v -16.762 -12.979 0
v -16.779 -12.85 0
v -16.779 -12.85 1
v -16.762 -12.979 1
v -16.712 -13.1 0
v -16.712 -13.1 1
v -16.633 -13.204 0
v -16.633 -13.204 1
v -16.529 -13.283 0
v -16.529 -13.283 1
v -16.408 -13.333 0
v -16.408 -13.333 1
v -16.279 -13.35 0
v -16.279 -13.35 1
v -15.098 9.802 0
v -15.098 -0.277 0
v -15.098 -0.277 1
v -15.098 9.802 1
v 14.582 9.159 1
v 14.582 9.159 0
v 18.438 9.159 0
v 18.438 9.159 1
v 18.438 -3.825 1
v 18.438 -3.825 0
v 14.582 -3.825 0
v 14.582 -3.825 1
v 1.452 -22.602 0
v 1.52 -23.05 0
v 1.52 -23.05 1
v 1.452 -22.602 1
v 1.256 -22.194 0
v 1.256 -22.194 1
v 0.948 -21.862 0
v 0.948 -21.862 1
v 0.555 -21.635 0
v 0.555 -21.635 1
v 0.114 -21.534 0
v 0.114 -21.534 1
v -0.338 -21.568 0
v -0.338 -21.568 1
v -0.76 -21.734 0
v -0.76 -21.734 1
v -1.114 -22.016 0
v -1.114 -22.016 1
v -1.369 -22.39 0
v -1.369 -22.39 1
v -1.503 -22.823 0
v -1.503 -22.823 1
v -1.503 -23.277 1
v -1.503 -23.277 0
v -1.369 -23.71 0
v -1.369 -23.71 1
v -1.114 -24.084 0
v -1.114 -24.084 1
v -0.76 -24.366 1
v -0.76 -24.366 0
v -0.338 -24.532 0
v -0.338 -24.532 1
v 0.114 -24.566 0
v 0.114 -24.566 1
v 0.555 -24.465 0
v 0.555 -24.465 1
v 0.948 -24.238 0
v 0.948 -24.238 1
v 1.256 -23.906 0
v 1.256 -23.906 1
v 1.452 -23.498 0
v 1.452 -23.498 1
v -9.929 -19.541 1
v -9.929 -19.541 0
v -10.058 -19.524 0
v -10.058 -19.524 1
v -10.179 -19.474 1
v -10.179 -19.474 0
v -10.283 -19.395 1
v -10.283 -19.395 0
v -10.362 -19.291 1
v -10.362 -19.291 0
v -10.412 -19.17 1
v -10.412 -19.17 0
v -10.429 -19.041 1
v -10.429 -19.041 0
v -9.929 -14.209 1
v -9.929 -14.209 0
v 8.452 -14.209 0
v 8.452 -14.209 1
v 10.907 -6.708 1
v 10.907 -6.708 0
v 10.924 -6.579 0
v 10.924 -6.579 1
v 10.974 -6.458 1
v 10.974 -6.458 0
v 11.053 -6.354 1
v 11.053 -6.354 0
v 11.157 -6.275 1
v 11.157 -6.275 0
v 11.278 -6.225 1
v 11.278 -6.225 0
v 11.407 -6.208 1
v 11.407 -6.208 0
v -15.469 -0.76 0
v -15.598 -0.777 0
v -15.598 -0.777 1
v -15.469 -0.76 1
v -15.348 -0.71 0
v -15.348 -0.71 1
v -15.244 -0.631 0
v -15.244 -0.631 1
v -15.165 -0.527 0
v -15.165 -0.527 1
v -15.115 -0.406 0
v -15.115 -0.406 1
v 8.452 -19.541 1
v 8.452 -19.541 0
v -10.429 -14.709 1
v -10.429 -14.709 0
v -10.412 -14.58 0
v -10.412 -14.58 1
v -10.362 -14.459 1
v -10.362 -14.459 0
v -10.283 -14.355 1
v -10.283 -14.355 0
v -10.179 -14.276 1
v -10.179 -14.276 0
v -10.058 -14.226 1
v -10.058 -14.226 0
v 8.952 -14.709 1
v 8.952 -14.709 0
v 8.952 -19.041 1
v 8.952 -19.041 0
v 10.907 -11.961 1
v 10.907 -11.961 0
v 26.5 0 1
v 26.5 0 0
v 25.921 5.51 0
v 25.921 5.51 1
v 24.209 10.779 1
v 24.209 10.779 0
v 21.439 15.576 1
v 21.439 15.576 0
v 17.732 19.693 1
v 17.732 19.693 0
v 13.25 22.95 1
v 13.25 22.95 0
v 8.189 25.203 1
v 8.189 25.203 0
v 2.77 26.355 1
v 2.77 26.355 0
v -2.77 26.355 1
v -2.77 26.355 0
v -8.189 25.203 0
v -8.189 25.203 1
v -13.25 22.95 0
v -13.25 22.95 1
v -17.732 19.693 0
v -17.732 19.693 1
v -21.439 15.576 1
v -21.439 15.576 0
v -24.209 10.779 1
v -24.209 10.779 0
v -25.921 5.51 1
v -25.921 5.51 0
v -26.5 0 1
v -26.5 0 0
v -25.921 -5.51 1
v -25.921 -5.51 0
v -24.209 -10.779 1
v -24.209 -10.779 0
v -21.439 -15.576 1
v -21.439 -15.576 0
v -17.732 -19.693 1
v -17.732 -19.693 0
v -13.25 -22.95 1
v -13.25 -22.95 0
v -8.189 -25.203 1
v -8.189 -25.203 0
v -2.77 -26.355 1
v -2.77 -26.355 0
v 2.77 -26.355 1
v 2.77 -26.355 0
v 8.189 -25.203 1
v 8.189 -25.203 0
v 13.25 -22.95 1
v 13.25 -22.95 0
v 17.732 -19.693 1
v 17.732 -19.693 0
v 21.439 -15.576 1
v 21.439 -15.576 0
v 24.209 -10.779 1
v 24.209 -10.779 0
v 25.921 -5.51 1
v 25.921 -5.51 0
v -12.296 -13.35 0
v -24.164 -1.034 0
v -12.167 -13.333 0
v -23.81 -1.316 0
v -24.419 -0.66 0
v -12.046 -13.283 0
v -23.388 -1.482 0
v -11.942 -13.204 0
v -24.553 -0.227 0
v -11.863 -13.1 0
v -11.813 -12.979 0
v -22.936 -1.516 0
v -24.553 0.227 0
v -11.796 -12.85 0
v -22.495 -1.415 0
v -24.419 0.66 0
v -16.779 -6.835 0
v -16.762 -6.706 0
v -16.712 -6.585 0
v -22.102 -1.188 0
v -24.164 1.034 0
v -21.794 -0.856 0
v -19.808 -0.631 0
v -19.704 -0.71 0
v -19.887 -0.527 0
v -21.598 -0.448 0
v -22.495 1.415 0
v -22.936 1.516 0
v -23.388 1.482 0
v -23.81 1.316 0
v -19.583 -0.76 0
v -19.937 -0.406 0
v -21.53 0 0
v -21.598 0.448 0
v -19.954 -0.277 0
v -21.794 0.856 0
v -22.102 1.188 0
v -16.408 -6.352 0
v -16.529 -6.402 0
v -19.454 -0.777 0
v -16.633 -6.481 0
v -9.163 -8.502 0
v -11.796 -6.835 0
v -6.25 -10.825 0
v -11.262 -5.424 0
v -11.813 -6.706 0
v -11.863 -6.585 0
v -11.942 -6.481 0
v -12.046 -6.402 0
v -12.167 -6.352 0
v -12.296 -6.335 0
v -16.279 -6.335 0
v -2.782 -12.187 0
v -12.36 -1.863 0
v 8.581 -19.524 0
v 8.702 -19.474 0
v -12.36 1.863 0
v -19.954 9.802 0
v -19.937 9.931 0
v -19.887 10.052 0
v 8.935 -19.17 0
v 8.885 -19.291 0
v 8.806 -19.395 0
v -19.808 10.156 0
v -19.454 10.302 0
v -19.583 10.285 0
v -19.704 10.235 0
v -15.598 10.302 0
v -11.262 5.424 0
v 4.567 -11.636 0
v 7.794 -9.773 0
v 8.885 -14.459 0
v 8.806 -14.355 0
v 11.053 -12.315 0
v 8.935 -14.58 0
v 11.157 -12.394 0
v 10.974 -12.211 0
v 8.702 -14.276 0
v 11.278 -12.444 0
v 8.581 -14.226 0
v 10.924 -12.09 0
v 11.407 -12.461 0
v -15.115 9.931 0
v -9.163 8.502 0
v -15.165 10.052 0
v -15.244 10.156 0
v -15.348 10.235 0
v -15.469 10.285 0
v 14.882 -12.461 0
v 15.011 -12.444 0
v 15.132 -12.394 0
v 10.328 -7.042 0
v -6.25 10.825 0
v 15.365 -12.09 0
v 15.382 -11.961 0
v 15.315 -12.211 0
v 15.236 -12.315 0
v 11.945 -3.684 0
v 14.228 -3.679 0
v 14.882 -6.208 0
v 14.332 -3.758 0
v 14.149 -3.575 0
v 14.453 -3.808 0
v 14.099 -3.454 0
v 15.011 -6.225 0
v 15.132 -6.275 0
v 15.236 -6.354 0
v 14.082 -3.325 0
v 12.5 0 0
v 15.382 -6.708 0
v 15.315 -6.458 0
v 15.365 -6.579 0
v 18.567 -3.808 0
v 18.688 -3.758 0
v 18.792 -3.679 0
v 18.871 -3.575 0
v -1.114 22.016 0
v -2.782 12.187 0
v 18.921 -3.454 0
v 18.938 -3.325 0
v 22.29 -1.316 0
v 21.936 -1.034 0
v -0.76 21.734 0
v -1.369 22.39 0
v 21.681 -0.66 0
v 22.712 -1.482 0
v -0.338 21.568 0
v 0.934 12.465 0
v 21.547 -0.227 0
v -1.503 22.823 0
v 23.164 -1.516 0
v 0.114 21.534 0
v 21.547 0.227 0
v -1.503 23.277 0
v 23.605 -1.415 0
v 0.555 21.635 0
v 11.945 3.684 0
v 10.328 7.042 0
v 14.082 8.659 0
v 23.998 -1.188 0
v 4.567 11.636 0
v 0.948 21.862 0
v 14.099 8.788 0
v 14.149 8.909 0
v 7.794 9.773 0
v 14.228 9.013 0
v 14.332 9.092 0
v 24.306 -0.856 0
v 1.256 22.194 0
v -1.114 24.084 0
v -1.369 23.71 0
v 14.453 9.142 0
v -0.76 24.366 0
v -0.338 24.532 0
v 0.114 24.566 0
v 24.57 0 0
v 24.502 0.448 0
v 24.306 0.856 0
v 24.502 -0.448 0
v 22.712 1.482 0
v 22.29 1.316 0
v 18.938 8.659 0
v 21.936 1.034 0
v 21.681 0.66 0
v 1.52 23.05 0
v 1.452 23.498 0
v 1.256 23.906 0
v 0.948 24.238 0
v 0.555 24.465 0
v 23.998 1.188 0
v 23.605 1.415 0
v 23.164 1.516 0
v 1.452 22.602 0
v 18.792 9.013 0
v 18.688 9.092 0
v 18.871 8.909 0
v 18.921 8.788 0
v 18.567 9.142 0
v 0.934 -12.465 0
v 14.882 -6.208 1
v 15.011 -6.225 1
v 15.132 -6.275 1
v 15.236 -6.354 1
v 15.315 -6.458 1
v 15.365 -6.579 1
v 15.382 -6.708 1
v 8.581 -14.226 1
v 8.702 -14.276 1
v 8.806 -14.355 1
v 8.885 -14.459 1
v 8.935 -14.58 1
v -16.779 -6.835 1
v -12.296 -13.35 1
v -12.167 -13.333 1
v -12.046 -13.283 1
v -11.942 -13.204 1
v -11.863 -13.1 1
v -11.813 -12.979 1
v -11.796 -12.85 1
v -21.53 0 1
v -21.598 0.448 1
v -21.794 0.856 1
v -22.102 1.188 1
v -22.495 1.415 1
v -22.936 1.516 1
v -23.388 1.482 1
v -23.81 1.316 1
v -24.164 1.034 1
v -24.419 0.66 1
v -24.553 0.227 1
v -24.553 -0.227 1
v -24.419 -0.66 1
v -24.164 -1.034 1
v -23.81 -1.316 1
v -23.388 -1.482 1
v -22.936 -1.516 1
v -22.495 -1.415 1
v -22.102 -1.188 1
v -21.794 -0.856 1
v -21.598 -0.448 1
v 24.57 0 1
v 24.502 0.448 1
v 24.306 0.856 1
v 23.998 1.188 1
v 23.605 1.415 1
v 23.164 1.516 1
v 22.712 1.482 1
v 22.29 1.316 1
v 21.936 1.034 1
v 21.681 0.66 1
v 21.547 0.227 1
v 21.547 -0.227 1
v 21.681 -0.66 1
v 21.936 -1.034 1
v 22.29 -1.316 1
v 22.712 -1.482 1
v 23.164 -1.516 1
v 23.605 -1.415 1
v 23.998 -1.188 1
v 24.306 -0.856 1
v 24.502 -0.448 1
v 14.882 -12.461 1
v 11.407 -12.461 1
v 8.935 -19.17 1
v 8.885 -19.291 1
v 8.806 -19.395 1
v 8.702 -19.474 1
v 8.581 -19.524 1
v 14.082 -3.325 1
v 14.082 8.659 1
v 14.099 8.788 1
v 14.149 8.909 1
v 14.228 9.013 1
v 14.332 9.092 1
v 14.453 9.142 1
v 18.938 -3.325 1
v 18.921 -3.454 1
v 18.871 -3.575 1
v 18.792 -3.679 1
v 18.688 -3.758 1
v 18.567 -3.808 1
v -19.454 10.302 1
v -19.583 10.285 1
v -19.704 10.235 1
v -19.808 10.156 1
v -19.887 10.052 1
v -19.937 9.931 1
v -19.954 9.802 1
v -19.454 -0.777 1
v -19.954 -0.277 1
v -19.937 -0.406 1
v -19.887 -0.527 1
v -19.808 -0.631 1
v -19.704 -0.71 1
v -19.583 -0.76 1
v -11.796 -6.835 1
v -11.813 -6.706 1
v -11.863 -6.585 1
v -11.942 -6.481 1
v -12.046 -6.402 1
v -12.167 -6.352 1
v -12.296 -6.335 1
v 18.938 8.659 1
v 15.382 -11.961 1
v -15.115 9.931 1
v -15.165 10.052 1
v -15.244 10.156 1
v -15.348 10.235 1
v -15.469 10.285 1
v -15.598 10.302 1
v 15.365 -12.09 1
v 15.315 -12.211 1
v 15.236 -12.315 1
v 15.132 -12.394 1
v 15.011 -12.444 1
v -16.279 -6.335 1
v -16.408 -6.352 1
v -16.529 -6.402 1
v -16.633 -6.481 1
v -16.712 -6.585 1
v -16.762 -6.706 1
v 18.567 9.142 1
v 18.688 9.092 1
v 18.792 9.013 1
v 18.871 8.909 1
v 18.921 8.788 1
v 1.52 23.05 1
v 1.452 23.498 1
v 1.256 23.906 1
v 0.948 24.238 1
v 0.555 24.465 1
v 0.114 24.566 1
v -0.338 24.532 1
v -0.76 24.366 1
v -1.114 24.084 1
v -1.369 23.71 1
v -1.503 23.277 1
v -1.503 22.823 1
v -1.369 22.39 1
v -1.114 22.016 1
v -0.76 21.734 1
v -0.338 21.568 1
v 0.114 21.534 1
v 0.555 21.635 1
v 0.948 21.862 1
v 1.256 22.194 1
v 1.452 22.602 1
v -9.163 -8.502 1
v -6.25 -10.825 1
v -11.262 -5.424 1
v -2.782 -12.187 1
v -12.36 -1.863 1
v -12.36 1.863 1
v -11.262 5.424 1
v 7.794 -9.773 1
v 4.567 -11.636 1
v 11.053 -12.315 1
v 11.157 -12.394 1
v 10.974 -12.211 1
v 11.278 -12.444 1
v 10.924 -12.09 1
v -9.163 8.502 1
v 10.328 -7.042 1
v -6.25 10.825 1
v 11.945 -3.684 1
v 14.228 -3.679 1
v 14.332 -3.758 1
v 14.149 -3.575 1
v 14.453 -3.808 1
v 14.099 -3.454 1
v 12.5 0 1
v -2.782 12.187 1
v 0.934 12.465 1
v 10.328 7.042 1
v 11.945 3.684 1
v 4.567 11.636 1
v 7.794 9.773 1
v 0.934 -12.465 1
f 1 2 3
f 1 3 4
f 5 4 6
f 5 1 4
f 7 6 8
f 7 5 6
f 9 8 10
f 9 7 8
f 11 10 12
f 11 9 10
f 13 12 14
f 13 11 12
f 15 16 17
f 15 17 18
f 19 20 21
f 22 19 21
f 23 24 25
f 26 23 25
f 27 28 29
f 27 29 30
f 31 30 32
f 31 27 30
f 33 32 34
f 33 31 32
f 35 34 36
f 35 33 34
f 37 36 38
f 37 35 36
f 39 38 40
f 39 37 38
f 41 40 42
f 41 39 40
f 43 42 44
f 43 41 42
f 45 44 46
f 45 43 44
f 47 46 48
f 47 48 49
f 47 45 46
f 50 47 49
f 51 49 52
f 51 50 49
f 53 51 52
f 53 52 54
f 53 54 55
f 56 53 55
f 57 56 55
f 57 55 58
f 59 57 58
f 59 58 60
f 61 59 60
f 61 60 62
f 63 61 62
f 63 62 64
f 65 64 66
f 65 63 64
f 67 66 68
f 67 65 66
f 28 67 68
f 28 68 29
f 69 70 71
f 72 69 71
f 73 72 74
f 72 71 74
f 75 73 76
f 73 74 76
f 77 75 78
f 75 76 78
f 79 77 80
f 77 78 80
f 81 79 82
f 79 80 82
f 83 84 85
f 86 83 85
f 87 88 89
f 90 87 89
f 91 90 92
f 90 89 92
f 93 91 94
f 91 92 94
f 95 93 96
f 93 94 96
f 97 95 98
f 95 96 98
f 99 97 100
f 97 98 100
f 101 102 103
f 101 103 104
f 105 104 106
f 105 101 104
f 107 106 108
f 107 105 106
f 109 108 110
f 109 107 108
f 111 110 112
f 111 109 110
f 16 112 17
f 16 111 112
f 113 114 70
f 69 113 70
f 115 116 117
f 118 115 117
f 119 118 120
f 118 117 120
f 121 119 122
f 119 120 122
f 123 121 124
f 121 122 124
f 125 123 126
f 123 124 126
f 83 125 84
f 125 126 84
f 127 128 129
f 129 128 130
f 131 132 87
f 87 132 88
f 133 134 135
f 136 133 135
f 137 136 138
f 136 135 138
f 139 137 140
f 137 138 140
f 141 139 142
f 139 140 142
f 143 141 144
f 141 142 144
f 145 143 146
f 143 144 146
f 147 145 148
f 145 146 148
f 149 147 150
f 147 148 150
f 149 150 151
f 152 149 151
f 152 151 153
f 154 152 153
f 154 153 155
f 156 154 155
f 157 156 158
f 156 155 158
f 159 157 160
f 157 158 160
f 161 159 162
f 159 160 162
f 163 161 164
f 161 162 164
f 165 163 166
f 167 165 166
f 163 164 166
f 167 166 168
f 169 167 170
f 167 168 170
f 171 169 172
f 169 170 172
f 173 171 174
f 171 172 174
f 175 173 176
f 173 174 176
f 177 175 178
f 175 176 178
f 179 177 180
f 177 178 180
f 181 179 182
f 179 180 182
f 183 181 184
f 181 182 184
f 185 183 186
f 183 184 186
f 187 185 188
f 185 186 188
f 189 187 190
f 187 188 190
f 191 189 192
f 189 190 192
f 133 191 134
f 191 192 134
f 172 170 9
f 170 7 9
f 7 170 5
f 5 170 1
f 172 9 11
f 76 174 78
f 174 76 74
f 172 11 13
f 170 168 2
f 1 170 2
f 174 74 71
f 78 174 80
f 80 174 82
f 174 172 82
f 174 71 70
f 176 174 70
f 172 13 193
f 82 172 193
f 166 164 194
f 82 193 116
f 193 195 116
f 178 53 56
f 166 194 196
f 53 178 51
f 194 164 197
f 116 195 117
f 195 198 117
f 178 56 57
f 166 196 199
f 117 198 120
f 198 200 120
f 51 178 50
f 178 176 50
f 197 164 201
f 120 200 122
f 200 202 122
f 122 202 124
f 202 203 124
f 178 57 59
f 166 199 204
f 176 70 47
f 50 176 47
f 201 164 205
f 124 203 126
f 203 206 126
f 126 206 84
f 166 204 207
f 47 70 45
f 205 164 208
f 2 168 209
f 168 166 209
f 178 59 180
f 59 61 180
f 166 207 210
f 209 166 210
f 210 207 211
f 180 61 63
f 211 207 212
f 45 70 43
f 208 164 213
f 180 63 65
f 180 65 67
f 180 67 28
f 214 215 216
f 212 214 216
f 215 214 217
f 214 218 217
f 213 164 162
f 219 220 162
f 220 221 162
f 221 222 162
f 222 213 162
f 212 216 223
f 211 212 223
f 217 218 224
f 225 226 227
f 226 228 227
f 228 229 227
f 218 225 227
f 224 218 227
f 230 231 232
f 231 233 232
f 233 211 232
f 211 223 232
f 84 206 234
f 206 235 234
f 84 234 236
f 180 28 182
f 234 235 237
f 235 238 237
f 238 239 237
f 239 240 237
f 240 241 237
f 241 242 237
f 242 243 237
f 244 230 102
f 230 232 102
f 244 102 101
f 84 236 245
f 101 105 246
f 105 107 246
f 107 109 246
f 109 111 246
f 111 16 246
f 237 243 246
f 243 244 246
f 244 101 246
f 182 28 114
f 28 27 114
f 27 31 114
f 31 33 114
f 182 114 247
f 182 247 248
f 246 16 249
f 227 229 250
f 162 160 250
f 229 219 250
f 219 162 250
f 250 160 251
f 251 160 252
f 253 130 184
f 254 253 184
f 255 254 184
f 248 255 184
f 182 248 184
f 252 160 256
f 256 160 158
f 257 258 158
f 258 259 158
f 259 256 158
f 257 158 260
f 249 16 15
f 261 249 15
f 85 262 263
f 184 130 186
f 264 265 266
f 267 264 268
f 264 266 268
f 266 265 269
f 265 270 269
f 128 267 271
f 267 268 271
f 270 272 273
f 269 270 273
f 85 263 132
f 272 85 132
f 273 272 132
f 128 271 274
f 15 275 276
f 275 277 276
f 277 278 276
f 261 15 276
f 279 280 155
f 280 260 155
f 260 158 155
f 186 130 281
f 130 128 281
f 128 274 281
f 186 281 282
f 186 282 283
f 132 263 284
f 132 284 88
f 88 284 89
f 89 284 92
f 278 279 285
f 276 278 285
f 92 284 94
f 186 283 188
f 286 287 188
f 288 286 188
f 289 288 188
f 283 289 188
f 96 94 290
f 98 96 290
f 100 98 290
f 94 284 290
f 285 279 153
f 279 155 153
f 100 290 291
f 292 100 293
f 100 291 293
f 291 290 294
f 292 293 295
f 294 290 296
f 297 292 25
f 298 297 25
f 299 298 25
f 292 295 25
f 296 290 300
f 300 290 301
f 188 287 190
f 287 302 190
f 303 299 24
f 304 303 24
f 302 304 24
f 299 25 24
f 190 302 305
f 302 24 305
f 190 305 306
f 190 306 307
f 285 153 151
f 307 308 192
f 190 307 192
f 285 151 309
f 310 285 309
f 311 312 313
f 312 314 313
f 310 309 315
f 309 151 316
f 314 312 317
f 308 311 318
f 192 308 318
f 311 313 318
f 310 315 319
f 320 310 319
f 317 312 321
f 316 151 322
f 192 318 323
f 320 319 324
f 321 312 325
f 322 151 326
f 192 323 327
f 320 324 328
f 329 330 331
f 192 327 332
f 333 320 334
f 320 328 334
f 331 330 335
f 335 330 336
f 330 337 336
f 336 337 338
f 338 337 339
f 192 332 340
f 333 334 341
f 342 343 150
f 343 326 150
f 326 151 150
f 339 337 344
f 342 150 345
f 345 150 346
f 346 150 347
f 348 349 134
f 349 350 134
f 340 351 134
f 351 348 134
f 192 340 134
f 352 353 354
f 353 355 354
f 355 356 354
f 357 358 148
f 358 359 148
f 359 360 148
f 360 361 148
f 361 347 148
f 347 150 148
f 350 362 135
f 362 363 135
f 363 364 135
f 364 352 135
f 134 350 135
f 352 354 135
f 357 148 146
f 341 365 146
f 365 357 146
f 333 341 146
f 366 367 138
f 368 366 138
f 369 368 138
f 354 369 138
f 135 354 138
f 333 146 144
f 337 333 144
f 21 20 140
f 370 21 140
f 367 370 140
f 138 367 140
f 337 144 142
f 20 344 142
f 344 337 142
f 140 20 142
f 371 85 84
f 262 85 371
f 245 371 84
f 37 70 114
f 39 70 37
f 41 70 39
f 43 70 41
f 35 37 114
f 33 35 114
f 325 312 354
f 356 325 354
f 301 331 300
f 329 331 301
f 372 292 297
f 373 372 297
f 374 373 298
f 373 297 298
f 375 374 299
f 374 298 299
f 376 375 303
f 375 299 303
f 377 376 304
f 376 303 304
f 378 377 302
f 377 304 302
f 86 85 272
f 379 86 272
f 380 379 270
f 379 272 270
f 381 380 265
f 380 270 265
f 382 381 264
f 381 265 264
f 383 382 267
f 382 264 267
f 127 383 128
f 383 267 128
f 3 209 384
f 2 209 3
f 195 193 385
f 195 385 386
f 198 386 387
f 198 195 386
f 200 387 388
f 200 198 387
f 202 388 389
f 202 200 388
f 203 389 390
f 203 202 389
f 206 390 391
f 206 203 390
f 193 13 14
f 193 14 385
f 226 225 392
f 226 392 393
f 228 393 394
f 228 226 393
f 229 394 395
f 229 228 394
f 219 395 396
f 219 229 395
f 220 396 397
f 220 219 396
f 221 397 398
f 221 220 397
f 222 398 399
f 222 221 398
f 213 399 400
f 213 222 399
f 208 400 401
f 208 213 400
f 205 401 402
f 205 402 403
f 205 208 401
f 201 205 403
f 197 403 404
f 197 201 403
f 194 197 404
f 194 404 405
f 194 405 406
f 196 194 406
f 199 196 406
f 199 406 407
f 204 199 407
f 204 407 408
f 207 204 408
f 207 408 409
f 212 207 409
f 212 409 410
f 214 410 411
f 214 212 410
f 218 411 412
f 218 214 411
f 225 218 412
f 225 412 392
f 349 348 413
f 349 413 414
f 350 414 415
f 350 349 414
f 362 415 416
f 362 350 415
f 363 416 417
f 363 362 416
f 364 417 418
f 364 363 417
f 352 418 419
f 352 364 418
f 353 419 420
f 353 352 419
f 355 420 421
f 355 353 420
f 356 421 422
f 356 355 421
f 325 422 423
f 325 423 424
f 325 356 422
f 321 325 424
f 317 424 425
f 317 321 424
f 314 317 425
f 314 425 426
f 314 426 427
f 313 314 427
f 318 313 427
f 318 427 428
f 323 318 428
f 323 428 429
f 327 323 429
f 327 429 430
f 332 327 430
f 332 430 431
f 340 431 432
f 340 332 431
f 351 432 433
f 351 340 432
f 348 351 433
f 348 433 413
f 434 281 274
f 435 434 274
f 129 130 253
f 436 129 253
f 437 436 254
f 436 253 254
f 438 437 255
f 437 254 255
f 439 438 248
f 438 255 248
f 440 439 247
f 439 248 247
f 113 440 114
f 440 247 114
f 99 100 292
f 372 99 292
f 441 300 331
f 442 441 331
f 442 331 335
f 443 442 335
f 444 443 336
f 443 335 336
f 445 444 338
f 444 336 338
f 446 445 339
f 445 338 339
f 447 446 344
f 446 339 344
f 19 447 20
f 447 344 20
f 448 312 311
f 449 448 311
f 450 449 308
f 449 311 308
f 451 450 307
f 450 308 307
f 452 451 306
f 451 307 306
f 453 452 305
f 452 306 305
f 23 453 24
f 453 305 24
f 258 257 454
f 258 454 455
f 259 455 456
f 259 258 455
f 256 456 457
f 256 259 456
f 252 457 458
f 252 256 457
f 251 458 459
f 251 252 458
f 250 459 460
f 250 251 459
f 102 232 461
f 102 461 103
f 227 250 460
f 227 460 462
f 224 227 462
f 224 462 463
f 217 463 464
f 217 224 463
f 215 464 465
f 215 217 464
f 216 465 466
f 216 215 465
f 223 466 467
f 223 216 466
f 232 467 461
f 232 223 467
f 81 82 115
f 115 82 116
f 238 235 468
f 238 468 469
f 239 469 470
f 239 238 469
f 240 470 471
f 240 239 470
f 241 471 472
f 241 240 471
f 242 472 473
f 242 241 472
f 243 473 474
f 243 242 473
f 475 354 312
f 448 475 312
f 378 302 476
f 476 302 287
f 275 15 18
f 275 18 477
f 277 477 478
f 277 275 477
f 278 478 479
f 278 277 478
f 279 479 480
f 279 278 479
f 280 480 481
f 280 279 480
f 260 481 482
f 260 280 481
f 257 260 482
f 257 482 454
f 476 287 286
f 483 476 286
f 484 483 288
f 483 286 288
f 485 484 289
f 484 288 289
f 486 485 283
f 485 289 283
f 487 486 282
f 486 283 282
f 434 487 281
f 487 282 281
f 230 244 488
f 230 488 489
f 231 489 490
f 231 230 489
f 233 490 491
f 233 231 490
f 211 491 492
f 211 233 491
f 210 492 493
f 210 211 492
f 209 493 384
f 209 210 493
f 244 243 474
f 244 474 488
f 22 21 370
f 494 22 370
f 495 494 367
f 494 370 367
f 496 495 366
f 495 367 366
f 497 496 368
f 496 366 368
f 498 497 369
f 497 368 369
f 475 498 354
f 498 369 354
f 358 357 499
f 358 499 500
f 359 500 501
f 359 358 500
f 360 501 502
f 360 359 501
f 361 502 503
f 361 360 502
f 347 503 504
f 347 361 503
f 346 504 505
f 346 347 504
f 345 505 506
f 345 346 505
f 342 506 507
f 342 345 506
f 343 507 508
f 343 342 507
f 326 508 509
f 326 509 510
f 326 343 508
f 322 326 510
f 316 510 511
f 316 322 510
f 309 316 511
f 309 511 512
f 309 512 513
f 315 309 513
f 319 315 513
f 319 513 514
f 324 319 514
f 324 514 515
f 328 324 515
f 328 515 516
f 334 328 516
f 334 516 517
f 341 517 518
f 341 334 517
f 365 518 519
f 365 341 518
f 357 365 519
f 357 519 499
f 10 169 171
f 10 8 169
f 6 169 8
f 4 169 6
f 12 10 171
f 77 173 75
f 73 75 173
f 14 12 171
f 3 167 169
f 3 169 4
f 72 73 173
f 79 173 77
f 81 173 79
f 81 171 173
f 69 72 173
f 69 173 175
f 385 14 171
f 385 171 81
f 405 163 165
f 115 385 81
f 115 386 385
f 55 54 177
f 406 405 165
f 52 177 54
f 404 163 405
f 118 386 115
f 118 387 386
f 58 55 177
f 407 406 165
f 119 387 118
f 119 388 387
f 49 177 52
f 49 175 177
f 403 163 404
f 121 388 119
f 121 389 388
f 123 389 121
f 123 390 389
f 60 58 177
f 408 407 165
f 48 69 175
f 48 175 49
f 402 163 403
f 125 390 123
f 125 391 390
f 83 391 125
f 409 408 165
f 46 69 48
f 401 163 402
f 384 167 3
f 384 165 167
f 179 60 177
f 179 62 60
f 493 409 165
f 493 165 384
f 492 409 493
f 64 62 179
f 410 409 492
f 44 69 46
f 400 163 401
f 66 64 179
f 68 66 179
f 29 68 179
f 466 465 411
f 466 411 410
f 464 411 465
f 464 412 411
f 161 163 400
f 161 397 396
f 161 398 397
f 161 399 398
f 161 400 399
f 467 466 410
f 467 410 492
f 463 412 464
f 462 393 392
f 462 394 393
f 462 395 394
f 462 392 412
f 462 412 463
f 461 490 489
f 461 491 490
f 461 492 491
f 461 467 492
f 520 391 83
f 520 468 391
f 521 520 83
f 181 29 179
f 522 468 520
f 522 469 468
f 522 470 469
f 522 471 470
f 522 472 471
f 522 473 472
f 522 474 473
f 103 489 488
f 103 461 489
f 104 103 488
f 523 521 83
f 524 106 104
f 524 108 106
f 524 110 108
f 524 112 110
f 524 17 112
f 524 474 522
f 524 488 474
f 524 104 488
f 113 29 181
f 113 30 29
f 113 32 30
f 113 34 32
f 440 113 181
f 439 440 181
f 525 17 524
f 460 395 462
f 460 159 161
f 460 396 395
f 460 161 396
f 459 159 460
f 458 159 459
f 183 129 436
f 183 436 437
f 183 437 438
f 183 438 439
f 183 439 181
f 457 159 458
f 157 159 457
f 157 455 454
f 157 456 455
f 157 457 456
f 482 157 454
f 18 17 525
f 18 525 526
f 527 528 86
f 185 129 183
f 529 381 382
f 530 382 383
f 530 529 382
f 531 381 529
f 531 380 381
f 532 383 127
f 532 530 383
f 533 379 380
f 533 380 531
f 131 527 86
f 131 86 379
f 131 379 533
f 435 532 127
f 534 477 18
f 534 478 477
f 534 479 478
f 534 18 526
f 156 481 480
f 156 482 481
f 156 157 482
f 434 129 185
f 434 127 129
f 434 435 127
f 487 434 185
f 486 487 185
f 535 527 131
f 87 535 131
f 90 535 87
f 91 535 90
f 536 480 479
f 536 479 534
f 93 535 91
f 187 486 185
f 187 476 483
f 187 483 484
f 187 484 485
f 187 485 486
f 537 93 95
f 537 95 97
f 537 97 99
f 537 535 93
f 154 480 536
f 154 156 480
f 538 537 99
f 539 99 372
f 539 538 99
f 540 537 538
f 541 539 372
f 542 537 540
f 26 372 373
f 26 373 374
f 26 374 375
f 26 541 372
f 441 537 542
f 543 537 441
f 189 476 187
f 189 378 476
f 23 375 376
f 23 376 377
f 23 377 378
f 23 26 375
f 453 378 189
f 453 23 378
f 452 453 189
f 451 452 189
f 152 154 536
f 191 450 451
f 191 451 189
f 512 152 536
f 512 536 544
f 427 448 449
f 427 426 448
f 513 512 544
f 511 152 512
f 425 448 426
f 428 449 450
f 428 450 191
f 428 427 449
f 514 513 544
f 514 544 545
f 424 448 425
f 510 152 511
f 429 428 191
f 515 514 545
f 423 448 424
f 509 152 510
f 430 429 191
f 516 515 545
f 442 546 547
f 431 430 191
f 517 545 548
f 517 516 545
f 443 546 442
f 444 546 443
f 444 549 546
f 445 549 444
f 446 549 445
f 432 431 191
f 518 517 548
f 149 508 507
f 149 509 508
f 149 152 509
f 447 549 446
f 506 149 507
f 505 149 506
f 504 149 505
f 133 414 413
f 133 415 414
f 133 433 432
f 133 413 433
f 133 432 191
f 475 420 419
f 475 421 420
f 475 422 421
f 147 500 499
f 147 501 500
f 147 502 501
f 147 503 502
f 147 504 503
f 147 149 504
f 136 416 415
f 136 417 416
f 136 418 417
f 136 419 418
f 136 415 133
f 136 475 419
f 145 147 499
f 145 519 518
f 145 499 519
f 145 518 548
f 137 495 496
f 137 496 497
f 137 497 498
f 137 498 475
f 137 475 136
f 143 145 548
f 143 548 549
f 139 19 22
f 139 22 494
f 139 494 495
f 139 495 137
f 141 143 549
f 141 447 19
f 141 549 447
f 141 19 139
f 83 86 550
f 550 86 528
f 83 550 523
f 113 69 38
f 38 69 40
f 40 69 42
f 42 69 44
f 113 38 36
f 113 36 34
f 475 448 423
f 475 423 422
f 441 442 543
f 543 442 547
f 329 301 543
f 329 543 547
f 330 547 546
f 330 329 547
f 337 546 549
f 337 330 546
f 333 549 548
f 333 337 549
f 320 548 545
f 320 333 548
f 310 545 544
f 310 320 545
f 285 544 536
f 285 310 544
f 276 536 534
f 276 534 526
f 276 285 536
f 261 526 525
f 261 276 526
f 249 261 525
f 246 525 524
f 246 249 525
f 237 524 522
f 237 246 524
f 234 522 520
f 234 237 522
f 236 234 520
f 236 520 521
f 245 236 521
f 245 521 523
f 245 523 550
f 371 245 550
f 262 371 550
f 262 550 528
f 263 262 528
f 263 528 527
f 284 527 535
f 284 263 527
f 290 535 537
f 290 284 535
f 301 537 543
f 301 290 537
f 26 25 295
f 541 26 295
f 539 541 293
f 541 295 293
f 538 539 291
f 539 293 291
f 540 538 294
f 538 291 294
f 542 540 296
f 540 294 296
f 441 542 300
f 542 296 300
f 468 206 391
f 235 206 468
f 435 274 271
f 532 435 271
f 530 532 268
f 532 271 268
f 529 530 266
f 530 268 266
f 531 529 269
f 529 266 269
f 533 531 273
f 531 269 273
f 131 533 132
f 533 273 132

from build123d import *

# Parameters (mm, degrees)
SKETCH_1_R          = 26.5
SKETCH_1_R_2        = 12.5
EXTRUDE_1_DEPTH     = 1
CUT_EXTRUDE_START   = 2.5
CUT_EXTRUDE_1_DEPTH = 1
SKETCH_3_R          = 1.52
CUT_EXTRUDE_2_DEPTH = 1


with BuildPart() as part:
    # 草图1 → 凸台-拉伸1 (new body)
    with BuildSketch(Plane.XY):
        Circle(SKETCH_1_R)
        Circle(SKETCH_1_R_2, mode=Mode.SUBTRACT)
    extrude(amount=EXTRUDE_1_DEPTH)

    # 草图2 → 切除-拉伸1 (cut)
    with BuildSketch(Plane(origin=(22.803986485, -9.350307143, -2.5), x_dir=(1, 0, 0), z_dir=(0, 0, 1)).offset(CUT_EXTRUDE_START)):
        with BuildLine():
            Line((-38.401990025, 19.652309401), (-42.257990025, 19.652309401))
            ThreePointArc((-42.257990025, 19.652309401), (-42.611543416, 19.505862792), (-42.757990025, 19.152309401))
            Line((-42.757990025, 19.152309401), (-42.757990025, 9.073309401))
            ThreePointArc((-42.757990025, 9.073309401), (-42.611543416, 8.719756011), (-42.257990025, 8.573309401))
            Line((-42.257990025, 8.573309401), (-38.401990025, 8.573309401))
            ThreePointArc((-38.401990025, 8.573309401), (-38.048436635, 8.719756011), (-37.901990025, 9.073309401))
            Line((-37.901990025, 9.073309401), (-37.901990025, 19.152309401))
            ThreePointArc((-37.901990025, 19.152309401), (-38.048436635, 19.505862792), (-38.401990025, 19.652309401))
        make_face()
        with BuildLine():
            Line((-8.221986913, 18.50930464), (-4.365986913, 18.50930464))
            ThreePointArc((-4.365986913, 18.50930464), (-4.012433522, 18.362858031), (-3.865986913, 18.00930464))
            Line((-3.865986913, 18.00930464), (-3.865986913, 6.02530464))
            ThreePointArc((-3.865986913, 6.02530464), (-4.012433522, 5.67175125), (-4.365986913, 5.52530464))
            Line((-4.365986913, 5.52530464), (-8.221986913, 5.52530464))
            ThreePointArc((-8.221986913, 5.52530464), (-8.575540303, 5.67175125), (-8.721986913, 6.02530464))
            Line((-8.721986913, 6.02530464), (-8.721986913, 18.00930464))
            ThreePointArc((-8.721986913, 18.00930464), (-8.575540303, 18.362858031), (-8.221986913, 18.50930464))
        make_face()
        with BuildLine():
            Line((-32.732983006, -4.858695665), (-14.351988011, -4.858695665))
            ThreePointArc((-14.351988011, -4.858695665), (-13.998434621, -5.005142274), (-13.851988011, -5.358695665))
            Line((-13.851988011, -5.358695665), (-13.851988011, -9.690695176))
            ThreePointArc((-13.851988011, -9.690695176), (-13.998434621, -10.044248567), (-14.351988011, -10.190695176))
            Line((-14.351988011, -10.190695176), (-32.732983006, -10.190695176))
            ThreePointArc((-32.732983006, -10.190695176), (-33.086536397, -10.044248567), (-33.232983006, -9.690695176))
            Line((-33.232983006, -9.690695176), (-33.232983006, -5.358695665))
            ThreePointArc((-33.232983006, -5.358695665), (-33.086536397, -5.005142274), (-32.732983006, -4.858695665))
        make_face()
        with BuildLine():
            Line((-35.099987523, 3.015306044), (-39.082987523, 3.015306044))
            ThreePointArc((-39.082987523, 3.015306044), (-39.436540913, 2.868859435), (-39.582987523, 2.515306044))
            Line((-39.582987523, 2.515306044), (-39.582987523, -3.499693956))
            ThreePointArc((-39.582987523, -3.499693956), (-39.436540913, -3.853247346), (-39.082987523, -3.999693956))
            Line((-39.082987523, -3.999693956), (-35.099987523, -3.999693956))
            ThreePointArc((-35.099987523, -3.999693956), (-34.746434132, -3.853247346), (-34.599987523, -3.499693956))
            Line((-34.599987523, -3.499693956), (-34.599987523, 2.515306044))
            ThreePointArc((-34.599987523, 2.515306044), (-34.746434132, 2.868859435), (-35.099987523, 3.015306044))
        make_face()
        with BuildLine():
            Line((-11.396988316, 3.142309279), (-7.921988316, 3.142309279))
            ThreePointArc((-7.921988316, 3.142309279), (-7.568434926, 2.99586267), (-7.421988316, 2.642309279))
            Line((-7.421988316, 2.642309279), (-7.421988316, -2.610690721))
            ThreePointArc((-7.421988316, -2.610690721), (-7.568434926, -2.964244111), (-7.921988316, -3.110690721))
            Line((-7.921988316, -3.110690721), (-11.396988316, -3.110690721))
            ThreePointArc((-11.396988316, -3.110690721), (-11.750541707, -2.964244111), (-11.896988316, -2.610690721))
            Line((-11.896988316, -2.610690721), (-11.896988316, 2.642309279))
            ThreePointArc((-11.896988316, 2.642309279), (-11.750541707, 2.99586267), (-11.396988316, 3.142309279))
        make_face()
    extrude(amount=CUT_EXTRUDE_1_DEPTH, mode=Mode.SUBTRACT)

    # 草图3 → 切除-拉伸2 (cut)
    with BuildSketch(Plane(origin=(22.803986485, -9.350307143, -2.5), x_dir=(1, 0, 0), z_dir=(0, 0, 1)).offset(CUT_EXTRUDE_START)):
        with Locations((-22.803986485, 32.400306763)):
            Circle(SKETCH_3_R)
        with Locations((-45.853986105, 9.350307143)):
            Circle(SKETCH_3_R)
        with Locations((-22.803986485, -13.699692477)):
            Circle(SKETCH_3_R)
        with Locations((0.246013135, 9.350307143)):
            Circle(SKETCH_3_R)
    extrude(amount=CUT_EXTRUDE_2_DEPTH, mode=Mode.SUBTRACT)


solid = part.part
